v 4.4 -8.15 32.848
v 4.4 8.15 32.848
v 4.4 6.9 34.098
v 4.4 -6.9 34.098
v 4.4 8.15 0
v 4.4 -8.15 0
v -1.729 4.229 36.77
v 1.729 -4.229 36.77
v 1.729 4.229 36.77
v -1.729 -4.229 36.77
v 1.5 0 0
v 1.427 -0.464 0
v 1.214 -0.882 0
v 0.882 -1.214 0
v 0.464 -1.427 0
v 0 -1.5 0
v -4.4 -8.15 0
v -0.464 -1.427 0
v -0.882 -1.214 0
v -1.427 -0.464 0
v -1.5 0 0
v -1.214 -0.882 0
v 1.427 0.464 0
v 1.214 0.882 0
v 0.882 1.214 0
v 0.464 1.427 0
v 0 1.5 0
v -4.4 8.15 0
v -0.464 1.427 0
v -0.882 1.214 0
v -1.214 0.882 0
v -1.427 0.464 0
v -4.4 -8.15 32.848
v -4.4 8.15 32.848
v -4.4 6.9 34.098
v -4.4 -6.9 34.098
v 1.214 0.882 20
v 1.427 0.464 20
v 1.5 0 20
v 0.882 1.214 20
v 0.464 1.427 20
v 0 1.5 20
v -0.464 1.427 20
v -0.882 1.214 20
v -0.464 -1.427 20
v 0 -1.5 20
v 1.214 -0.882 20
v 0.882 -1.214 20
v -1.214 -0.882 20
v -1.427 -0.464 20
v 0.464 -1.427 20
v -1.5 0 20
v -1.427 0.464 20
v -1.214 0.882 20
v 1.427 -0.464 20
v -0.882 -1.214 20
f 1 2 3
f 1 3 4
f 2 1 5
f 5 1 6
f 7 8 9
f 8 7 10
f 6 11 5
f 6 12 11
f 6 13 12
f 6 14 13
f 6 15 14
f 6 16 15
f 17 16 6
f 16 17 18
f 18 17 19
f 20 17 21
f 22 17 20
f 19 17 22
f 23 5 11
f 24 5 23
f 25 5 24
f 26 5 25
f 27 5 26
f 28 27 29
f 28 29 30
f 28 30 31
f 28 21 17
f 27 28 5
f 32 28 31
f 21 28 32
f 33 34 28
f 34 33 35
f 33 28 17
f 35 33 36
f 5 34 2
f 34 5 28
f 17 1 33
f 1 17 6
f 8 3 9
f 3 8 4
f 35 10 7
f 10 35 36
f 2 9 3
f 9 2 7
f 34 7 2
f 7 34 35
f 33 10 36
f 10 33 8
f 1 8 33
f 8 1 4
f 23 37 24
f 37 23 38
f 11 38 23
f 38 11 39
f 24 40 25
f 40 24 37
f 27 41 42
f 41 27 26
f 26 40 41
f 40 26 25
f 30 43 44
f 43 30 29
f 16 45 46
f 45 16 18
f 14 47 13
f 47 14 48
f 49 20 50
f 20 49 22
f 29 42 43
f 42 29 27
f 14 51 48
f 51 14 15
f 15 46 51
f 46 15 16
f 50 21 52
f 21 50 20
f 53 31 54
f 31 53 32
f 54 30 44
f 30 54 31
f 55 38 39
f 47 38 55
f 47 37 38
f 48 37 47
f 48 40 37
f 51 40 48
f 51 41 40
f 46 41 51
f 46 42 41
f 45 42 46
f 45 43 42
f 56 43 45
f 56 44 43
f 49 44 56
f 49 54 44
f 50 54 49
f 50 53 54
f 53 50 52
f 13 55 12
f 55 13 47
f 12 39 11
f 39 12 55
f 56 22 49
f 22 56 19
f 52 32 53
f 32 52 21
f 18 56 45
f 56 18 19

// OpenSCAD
/*   	Flyscreen quadcopter.
		
		These pieces are designed to fit onto the square folded aluminium bars used
		as frames around flyscreens.
		
		by Travis Howse <tjhowse@gmail.com>
		2012.   License, GPL v2 or later
**************************************************/

// Screen frame profile
/*
^
| Y
|
|	X
------>

-----	
| i	|
| n	|
| n	| <-- body
| r	|
-----
	|
	| <-- channel
-----
*/

inner_x = 9.3;
inner_y = 16.3;

whole_x = 9.9;
whole_y = 24.0;

channel_x = 7.5;
channel_y = 4.88;

body_x = whole_x;
body_y = 17.75;

plug_z = 20;
plug_exp = 0.5;
plug_x = inner_x - plug_exp;
plug_y = inner_y - plug_exp;

wall_thickness = 2;
spread_gap = 0.75;
hub_spread_gap = 0;
spread_slice = 0.6;
$fn = 20;

plate_hole_dist = 42;
plate_xy = (plate_hole_dist+5*wall_thickness)/sqrt(2);

hub_sleeve_z = 20;
hub_plug_z = 30;

leg_clip_clippy = 1.5;
leg_clip_z = 10;
leg_z = 50;
leg_xy = 5;

zff = 0.005;

apm_sleeve_z = 15;

module spreader_plug()
{
	// This piece forms a part of the motor_mount();
	translate([0,0,plug_z/2]) difference()
	{
		union()
		{
			difference()
			{
				cube([plug_x-spread_gap,plug_y-spread_gap,plug_z],true);
				rotate([0,0,atan(plug_x/plug_y)]) cube([spread_slice,100,plug_z],true);
				rotate([0,0,-atan(plug_x/plug_y)]) cube([spread_slice,100,plug_z],true);
			}
		}
		translate([0,0,-plug_z/2-5]) cylinder(r1=2.8/2, r2=0.8,h=plug_z*2);
	}	
}

module mount_plate()
{
	// This piece forms a part of the motor_mount();
	difference()
	{
		cube([plate_xy,plate_xy,wall_thickness],true);
		for (i = [45, 135, 225, 315])
		{
			rotate([0,0,i]) translate([plate_hole_dist/2,0,-zff-wall_thickness/2]) cylinder(r=1.5,h=10);
		}
	}	
}

module motor_mount()
{
	// This clips onto the end of the arm. You can optionally put a screw in the end
	// to assist with locking it in place.
	
	difference()
	{
		cube([whole_x+2*wall_thickness,whole_y+2*wall_thickness,plate_xy]);
		translate([wall_thickness,wall_thickness,wall_thickness]) cube([whole_x,whole_y,plate_xy]);
		translate([(whole_x+2*wall_thickness)/2,body_y/2+wall_thickness,0]) cylinder(r=1.5, h=100);
	}
	translate([(whole_x+2*wall_thickness)/2,wall_thickness/2,plate_xy/2]) rotate([90,0,0]) mount_plate();
	translate([(whole_x+2*wall_thickness)/2,body_y/2+wall_thickness,0]) spreader_plug();
}

module hub_sleeve()
{
	// This piece slips over the arm prior to attaching it to the hub. When attached
	// to the hub, this slides back towards the hub, locking the arm on.
	difference()
	{
		cube([whole_x+2*wall_thickness,whole_y+2*wall_thickness,hub_sleeve_z]);
		translate([wall_thickness,wall_thickness,0]) cube([whole_x,whole_y,hub_sleeve_z]);
	}
}

module hub_junction()
{
	// This is the centre hub piece. The four arms join here.
	difference()
	{
		union()
		{
			for (i = [0, 90, 180, 270])
			{
				rotate([0,0,i]) translate([0,hub_plug_z/2,0]) rotate([90,0,0]) cube([plug_x-hub_spread_gap/2,plug_y+0.5,hub_plug_z],true);
			}
		}
		// This prompts the slicer to add reenforcement here.
		translate([0,0,-plug_y/2]) #cylinder(r=0.1,h=plug_y);
		for (i = [0, 90, 180, 270])
		{
			rotate([0,0,i]) translate([-(plug_x-hub_spread_gap/2)/2-1,0,-(plug_y+0.5)/2]) #cylinder(r=0.3,h=plug_y+0.5);
		}		
	}
	for (i = [0, 90, 180, 270])
	{
		rotate([0,0,i]) translate([4.4,-4.4,-(plug_y+0.5)/2]) rotate([90,0,0]) fillet(4,plug_y+0.5);
	}	
}

module fillet(radius, length)
{
	translate([-zff,0,-zff]) difference()
	{
		cube([radius,length,radius]);
		translate([radius,length+zff,radius]) rotate([90,0,0]) cylinder(r=radius,h=length+2*zff);
	}
}

module hub_junction_channel()
{
	// This is a little bar that fits into the channel and can be hammered into the
	// sleve to strengthen the grip at the hub.
	rotate([0,0,i]) translate([0,hub_plug_z/2,0]) rotate([90,0,0]) cube([channel_x-spread_gap/2,channel_y-spread_gap/2,hub_plug_z],true);
}

module leg()
{
	// This clips onto the arm near the motor mount and holds the quad leg_z mm off the
	// ground. They are somewhat sacrificial, expect to break a few on rough landings.
	// This is intentional, because they're cheap and easy to make. It's better to 
	// break these than other bits.
	
	whole_y = whole_y*1.04;
	
	difference()
	{
		cube([whole_x+2*wall_thickness,whole_y+2*wall_thickness,hub_sleeve_z]);
		translate([wall_thickness,wall_thickness,0]) cube([whole_x,whole_y,hub_sleeve_z]);
		translate([wall_thickness*2,leg_clip_clippy*2,0]) cube([whole_x,whole_y-2*leg_clip_clippy,hub_sleeve_z]);
	}
	translate([-leg_xy,0,0]) cube([leg_xy,leg_z+whole_y+2*wall_thickness,leg_xy]);
}

module apm_mount()
{
	// This clips onto the arm near the motor mount and holds the quad leg_z mm off the
	// ground. They are somewhat sacrificial, expect to break a few on rough landings.
	// This is intentional, because they're cheap and easy to make. It's better to 
	// break these than other bits.
	
	whole_x = whole_x*1.04;
	whole_y = whole_y*1.04;
	
	apm_space_z = 6;
	apm_band_gap = 4;
	
	peg_size = 3;
	
	difference()
	{
		cube([whole_x+2*wall_thickness,whole_y+2*wall_thickness,apm_sleeve_z]);
		translate([wall_thickness,wall_thickness,0]) cube([whole_x,whole_y,apm_sleeve_z]);
		translate([wall_thickness*2,leg_clip_clippy*2,0]) cube([whole_x,whole_y-2*leg_clip_clippy,apm_sleeve_z]);
	}
	translate([whole_x/2+wall_thickness-leg_xy/2,whole_y+2*wall_thickness,0]) #cube([leg_xy,apm_space_z+2*peg_size+apm_band_gap,peg_size]);
	translate([whole_x/2+wall_thickness-peg_size*1.5,whole_y+2*wall_thickness+apm_space_z,0]) cube([peg_size*3,peg_size,peg_size]);
	translate([whole_x/2+wall_thickness-peg_size*1.5,whole_y+2*wall_thickness+apm_space_z+peg_size+apm_band_gap,0]) cube([peg_size*3,peg_size,peg_size]);
	translate([-leg_xy/2,0,0]) cube([leg_xy/2,whole_y+2*wall_thickness,leg_xy]);
}

module apm_tab()
{
	difference()
	{
		hull()
		{
			translate([0,10,0]) cube([10,10,2]);
			translate([5,5,0]) cylinder(r=5,h=2);
		}
		translate([5,5,0]) cylinder(r=2.5,h=2);
	}
	translate([0,8,0])cube([10,2,4]);
}

module apm_frame()
{
	//71x45
	apm_y = 71;
	
	cube([10,apm_y,2],true);
	cube([45,10,2],true);
	translate([-5,-apm_y/2-10,-1]) apm_tab();
	mirror([0,-1,0]) translate([-5,-apm_y/2-10,-1]) apm_tab();
	translate([45/2+10,-5,-1]) rotate([0,0,90]) apm_tab();
	mirror([-1,0,0]) translate([45/2+10,-5,-1]) rotate([0,0,90]) apm_tab();


}

module leg2()
{
	// This clips onto the arm near the motor mount and holds the quad leg_z mm off the
	// ground. They are somewhat sacrificial, expect to break a few on rough landings.
	// This is intentional, because they're cheap and easy to make. It's better to 
	// break these than other bits.
	
	whole_y = whole_y*1.04;
	leg2_clip_clippy = 2;
	
	leg_r = 30;
	leg_z = 10;
	leg_wall_thickness = 1.6;
	
	difference()
	{
		cube([whole_x+2*wall_thickness,whole_y+2*wall_thickness,hub_sleeve_z]);
		translate([wall_thickness,wall_thickness,0]) cube([whole_x,whole_y,hub_sleeve_z]);
		#translate([wall_thickness+leg2_clip_clippy,0,0]) cube([whole_x-2*leg2_clip_clippy,whole_y,hub_sleeve_z]);
	}
	translate([(whole_x+2*wall_thickness)/2,whole_y+wall_thickness+leg_r,0]) difference()
	{
		cylinder(r=leg_r,h=leg_z,$fn=30);
		cylinder(r=leg_r-leg_wall_thickness,h=leg_z,$fn=30);
	}
	
}

module leg3()
{
	// This clips onto the arm near the motor mount and holds the quad leg_z mm off the
	// ground. They are somewhat sacrificial, expect to break a few on rough landings.
	// This is intentional, because they're cheap and easy to make. It's better to 
	// break these than other bits.
	
	whole_y = whole_y*1.04;
	leg2_clip_clippy = 2;
	
	leg_r = 30;
	leg_z = 10;
	leg_wall_thickness = 1.125;
	hub_sleeve_z = 10;
	
	difference()
	{
		union()
		{
			difference()
			{
				cube([whole_x+2*wall_thickness,whole_y+2*wall_thickness,hub_sleeve_z]);
				translate([wall_thickness+leg2_clip_clippy,0,0]) cube([whole_x-2*leg2_clip_clippy,whole_y,hub_sleeve_z]);
			}
			translate([-1,2,0]) cube([2,2,hub_sleeve_z]);
			translate([whole_x+2*wall_thickness-1,2,0]) cube([2,2,hub_sleeve_z]);
			translate([(whole_x+2*wall_thickness)/2,whole_y+wall_thickness+leg_r,0]) difference()
			{
				union()
				{
					intersection()
					{
						translate([0,11,0]) scale([0.94,1.4,1]) cylinder(r=leg_r+1.5*wall_thickness,h=leg_z,$fn=30);
						translate([0,-60,0]) cube([100,100,100],true);
					}
					cylinder(r=leg_r,h=leg_z,$fn=30);
				}
				cylinder(r=leg_r-leg_wall_thickness*1.3,h=leg_z,$fn=30);
			}
		}
		translate([wall_thickness,wall_thickness,0]) cube([whole_x,whole_y,hub_sleeve_z]);
	}
	
}

module leg3_clip(hub_sleeve_z = 10)
{
	whole_x = whole_x+wall_thickness/2+0.5;
	
	
	difference()
	{
		cube([whole_x+4*wall_thickness,9+wall_thickness,hub_sleeve_z]);
		translate([wall_thickness,0,0]) cube([whole_x+2*wall_thickness,9,hub_sleeve_z]);
		translate([1,2,0]) cube([2,4,hub_sleeve_z]);
		translate([whole_x+2*wall_thickness+1,2,0]) cube([2,4,hub_sleeve_z]);
	}

}

module cam_mount()
{
	whole_y = whole_y*1.04;
	leg2_clip_clippy = 2;
	
	//leg_r = 28.5/2;
	//leg_r = 28.5/2;
	nleg_r = 15;
	leg_z = 10;
	leg_wall_thickness = 1.125;
	hub_sleeve_z = 10;
	
	extra_z_offset = 8;
	
	difference()
	{
		union()
		{
			difference()
			{
				cube([whole_x+2*wall_thickness,whole_y+2*wall_thickness+extra_z_offset,hub_sleeve_z]);
				translate([wall_thickness+leg2_clip_clippy,0,0]) cube([whole_x-2*leg2_clip_clippy,whole_y,hub_sleeve_z]);
			}
			translate([-1,2,0]) cube([2,2,hub_sleeve_z]);
			translate([whole_x+2*wall_thickness-1,2,0]) cube([2,2,hub_sleeve_z]);
			translate([(whole_x+2*wall_thickness)/2,whole_y+wall_thickness+leg_r+extra_z_offset+1,0]) difference()
			{
				union()
				{
					intersection()
					{
						translate([0,7,0]) scale([0.88,1.4,1]) cylinder(r=leg_r+1.5*wall_thickness,h=leg_z,$fn=30);
						translate([0,-55,0]) cube([100,100,100],true);
					}
					cylinder(r=leg_r,h=leg_z,$fn=30);
				}
				cylinder(r=leg_r-leg_wall_thickness*1.3,h=leg_z,$fn=30);
			}
		}
		translate([wall_thickness,wall_thickness,0]) cube([whole_x,whole_y,hub_sleeve_z]);
		translate([wall_thickness-whole_x/4,wall_thickness+extra_z_offset+leg_z+leg_r+whole_y/2,0]) #cube([whole_x*1.5,whole_y,hub_sleeve_z]);
	}
}

module arm_clip(hub_sleeve_z = 10)
{
	whole_y = whole_y*1.04;
	leg2_clip_clippy = 2;
	
	leg_r = 30;
	leg_z = 10;
	leg_wall_thickness = 1.125;
	
	difference()
	{
		union()
		{
			difference()
			{
				cube([whole_x+2*wall_thickness,whole_y+2*wall_thickness,hub_sleeve_z]);
				translate([wall_thickness+leg2_clip_clippy,0,0]) cube([whole_x-2*leg2_clip_clippy,whole_y,hub_sleeve_z]);
			}
			translate([-1,2,0]) cube([2,2,hub_sleeve_z]);
			translate([whole_x+2*wall_thickness-1,2,0]) cube([2,2,hub_sleeve_z]);
		}
		translate([wall_thickness,wall_thickness,0]) cube([whole_x,whole_y,hub_sleeve_z]);
	}
}

module apm_mount2()
{
	// This clips onto the arm near the motor mount and holds the quad leg_z mm off the
	// ground. They are somewhat sacrificial, expect to break a few on rough landings.
	// This is intentional, because they're cheap and easy to make. It's better to 
	// break these than other bits.
	
	whole_x = whole_x*1.04;
	whole_y = whole_y*1.04;
	
	apm_space_z = 6;
	apm_band_gap = 4;
	
	peg_size = 4;
	
	arm_clip();
	
	translate([whole_x/2+wall_thickness-leg_xy/2,whole_y+2*wall_thickness,0]) cube([leg_xy,apm_space_z+2*peg_size+apm_band_gap,peg_size]);
	
	translate([0,whole_y+2*wall_thickness,0]) cube([whole_x/1.04+2*wall_thickness,peg_size+apm_space_z,peg_size]);
	translate([whole_x/2+wall_thickness-peg_size*1.5,whole_y+2*wall_thickness+apm_space_z+peg_size+apm_band_gap,0]) cube([peg_size*3,peg_size,peg_size]);
}

module leg4()
{
	// This clips onto the arm near the motor mount and holds the quad leg_z mm off the
	// ground. They are somewhat sacrificial, expect to break a few on rough landings.
	// This is intentional, because they're cheap and easy to make. It's better to 
	// break these than other bits.
	
	whole_y = whole_y*1.04;
	leg2_clip_clippy = 2;
	
	leg_r = 30;
	leg_z = 10;
	leg_wall_thickness = 2.2;
	hub_sleeve_z = 10;
	spring_stem = 4.5;
	
	intersection()
	{
		translate([-(leg_r),0,0]) cube([2*(leg_r),100,100]);
		union()
		{
			translate([-(whole_x+2*wall_thickness)/2,0,0])	difference()
			{
				difference()
				{
					cube([whole_x+2*wall_thickness,whole_y+2*wall_thickness,hub_sleeve_z]);
					translate([wall_thickness+leg2_clip_clippy,0,0]) cube([whole_x-2*leg2_clip_clippy,whole_y,hub_sleeve_z]);
				}
						
				translate([wall_thickness,wall_thickness,0]) cube([whole_x,whole_y,hub_sleeve_z]);
			}
			translate([-2-(whole_x+wall_thickness)/2,2,0]) cube([2,2,hub_sleeve_z]);
			translate([(whole_x+wall_thickness)/2,2,0]) cube([2,2,hub_sleeve_z]);
			
			translate([0,whole_y+2*wall_thickness+leg_r,0]) difference()	
			{
				union()
				{
					cylinder(r=leg_r,h=leg_z);
					translate([0,10,0]) scale([0.94,1.4,1]) cylinder(r=leg_r+1.5*wall_thickness,h=leg_z,$fn=30);
				}
				translate([0,0,-zff]) cylinder(r=leg_r-leg_wall_thickness,h=leg_z+2*zff);
				translate([0,50,0]) cube([100,100,100],true);
				translate([-whole_x/2,-(whole_y+1*wall_thickness+leg_r),0]) cube([whole_x,whole_y,hub_sleeve_z]);
			}
			
			translate([0,spring_stem+leg_r*2,0]) rotate([0,0,180]) leg4_part(30,5+spring_stem);
			translate([0,leg_r*2,leg_z]) rotate([0,180,180]) leg4_part(30,5);
		}
	}
}

module leg4_part(radius, stem)
{
	whole_y = whole_y*1.04;
	leg2_clip_clippy = 2;
	
	leg_r = 30;
	leg_z = 10;
	leg_wall_thickness = 2.2;
	hub_sleeve_z = 10;
	
	difference()
	{
		cylinder(r=radius,h=leg_z);
		translate([0,0,-zff]) cylinder(r=radius-leg_wall_thickness,h=leg_z+2*zff);
		translate([0,50,0]) cube([100,100,100],true);
		rotate([0,0,45]) translate([0,50,0]) cube([100,100,100],true);
		
	}
	translate([radius-leg_wall_thickness,0,0]) cube([leg_wall_thickness,stem,leg_z]);
}

module flyscreen_rightangle()
{
	// This is the centre hub piece. The four arms join here.
	difference()
	{
		union()
		{
			for (i = [0, 90])
			{
				rotate([0,0,i]) translate([0,hub_plug_z/2,0]) rotate([90,90,0]) cube([plug_x-hub_spread_gap/2,plug_y+0.5,hub_plug_z+1.3]);
			}
		}
		// This prompts the slicer to add reenforcement here.
	
	}
	
}

module motor_mount2()
{
	arm_clip(plate_xy);
	translate([whole_x+2*wall_thickness,whole_y+2.5*wall_thickness,0]) rotate([90,0,0]) fillet(5,plate_xy);
	translate([0,whole_y+2.5*wall_thickness,0]) rotate([90,0,-90]) fillet(5,plate_xy);
	translate([whole_x/2+wall_thickness,whole_y+3*wall_thickness-0.2,plate_xy/2]) rotate([90,0,0]) mount_plate();
	// To help home the

}

module fillet(radius, length)
{
	translate([-zff,0,-zff]) difference()
	{
		cube([radius,length,radius]);
		translate([radius,length+zff,radius]) rotate([90,0,0]) cylinder(r=radius,h=length+2*zff);
	}
}

module motor_mount2_plug()
{
	difference()
	{
		translate([-(plug_x-hub_spread_gap/2)/2,-(plug_y+0.5)/2,0]) cube([plug_x-hub_spread_gap/2,plug_y+0.5,plate_xy]);
		translate([plug_x-hub_spread_gap/2,0,plate_xy+(20*sqrt(2))/4]) rotate([0,45,0]) cube([20,20,20],true);
		translate([-plug_x-hub_spread_gap/2,0,plate_xy+(20*sqrt(2))/4]) rotate([0,45,0]) cube([20,20,20],true);
		
		translate([0,plug_y+0.5-5,plate_xy+(20*sqrt(2))/4]) rotate([45,0,0]) cube([20,20,20],true);
		translate([0,-(plug_y+0.5)+5,plate_xy+(20*sqrt(2))/4]) rotate([45,0,0]) cube([20,20,20],true);
		cylinder(r=1.5,h=20);
	}
	
}
	
// Four of each of these:
//motor_mount();
//hub_sleeve();
//hub_junction_channel();
//leg();
//apm_mount();
//leg2();
//leg3();
//leg4();
//leg4_part(30,10);
//motor_mount2();
//translate([50,0,0]) motor_mount();
//leg3_clip(plate_xy);
 motor_mount2_plug();
//cam_mount();
//apm_mount2();

//apm_mount2();
//apm_frame();
//cube([45,70,20],true);

// And one of these:
//hub_junction();
//flyscreen_rightangle();
